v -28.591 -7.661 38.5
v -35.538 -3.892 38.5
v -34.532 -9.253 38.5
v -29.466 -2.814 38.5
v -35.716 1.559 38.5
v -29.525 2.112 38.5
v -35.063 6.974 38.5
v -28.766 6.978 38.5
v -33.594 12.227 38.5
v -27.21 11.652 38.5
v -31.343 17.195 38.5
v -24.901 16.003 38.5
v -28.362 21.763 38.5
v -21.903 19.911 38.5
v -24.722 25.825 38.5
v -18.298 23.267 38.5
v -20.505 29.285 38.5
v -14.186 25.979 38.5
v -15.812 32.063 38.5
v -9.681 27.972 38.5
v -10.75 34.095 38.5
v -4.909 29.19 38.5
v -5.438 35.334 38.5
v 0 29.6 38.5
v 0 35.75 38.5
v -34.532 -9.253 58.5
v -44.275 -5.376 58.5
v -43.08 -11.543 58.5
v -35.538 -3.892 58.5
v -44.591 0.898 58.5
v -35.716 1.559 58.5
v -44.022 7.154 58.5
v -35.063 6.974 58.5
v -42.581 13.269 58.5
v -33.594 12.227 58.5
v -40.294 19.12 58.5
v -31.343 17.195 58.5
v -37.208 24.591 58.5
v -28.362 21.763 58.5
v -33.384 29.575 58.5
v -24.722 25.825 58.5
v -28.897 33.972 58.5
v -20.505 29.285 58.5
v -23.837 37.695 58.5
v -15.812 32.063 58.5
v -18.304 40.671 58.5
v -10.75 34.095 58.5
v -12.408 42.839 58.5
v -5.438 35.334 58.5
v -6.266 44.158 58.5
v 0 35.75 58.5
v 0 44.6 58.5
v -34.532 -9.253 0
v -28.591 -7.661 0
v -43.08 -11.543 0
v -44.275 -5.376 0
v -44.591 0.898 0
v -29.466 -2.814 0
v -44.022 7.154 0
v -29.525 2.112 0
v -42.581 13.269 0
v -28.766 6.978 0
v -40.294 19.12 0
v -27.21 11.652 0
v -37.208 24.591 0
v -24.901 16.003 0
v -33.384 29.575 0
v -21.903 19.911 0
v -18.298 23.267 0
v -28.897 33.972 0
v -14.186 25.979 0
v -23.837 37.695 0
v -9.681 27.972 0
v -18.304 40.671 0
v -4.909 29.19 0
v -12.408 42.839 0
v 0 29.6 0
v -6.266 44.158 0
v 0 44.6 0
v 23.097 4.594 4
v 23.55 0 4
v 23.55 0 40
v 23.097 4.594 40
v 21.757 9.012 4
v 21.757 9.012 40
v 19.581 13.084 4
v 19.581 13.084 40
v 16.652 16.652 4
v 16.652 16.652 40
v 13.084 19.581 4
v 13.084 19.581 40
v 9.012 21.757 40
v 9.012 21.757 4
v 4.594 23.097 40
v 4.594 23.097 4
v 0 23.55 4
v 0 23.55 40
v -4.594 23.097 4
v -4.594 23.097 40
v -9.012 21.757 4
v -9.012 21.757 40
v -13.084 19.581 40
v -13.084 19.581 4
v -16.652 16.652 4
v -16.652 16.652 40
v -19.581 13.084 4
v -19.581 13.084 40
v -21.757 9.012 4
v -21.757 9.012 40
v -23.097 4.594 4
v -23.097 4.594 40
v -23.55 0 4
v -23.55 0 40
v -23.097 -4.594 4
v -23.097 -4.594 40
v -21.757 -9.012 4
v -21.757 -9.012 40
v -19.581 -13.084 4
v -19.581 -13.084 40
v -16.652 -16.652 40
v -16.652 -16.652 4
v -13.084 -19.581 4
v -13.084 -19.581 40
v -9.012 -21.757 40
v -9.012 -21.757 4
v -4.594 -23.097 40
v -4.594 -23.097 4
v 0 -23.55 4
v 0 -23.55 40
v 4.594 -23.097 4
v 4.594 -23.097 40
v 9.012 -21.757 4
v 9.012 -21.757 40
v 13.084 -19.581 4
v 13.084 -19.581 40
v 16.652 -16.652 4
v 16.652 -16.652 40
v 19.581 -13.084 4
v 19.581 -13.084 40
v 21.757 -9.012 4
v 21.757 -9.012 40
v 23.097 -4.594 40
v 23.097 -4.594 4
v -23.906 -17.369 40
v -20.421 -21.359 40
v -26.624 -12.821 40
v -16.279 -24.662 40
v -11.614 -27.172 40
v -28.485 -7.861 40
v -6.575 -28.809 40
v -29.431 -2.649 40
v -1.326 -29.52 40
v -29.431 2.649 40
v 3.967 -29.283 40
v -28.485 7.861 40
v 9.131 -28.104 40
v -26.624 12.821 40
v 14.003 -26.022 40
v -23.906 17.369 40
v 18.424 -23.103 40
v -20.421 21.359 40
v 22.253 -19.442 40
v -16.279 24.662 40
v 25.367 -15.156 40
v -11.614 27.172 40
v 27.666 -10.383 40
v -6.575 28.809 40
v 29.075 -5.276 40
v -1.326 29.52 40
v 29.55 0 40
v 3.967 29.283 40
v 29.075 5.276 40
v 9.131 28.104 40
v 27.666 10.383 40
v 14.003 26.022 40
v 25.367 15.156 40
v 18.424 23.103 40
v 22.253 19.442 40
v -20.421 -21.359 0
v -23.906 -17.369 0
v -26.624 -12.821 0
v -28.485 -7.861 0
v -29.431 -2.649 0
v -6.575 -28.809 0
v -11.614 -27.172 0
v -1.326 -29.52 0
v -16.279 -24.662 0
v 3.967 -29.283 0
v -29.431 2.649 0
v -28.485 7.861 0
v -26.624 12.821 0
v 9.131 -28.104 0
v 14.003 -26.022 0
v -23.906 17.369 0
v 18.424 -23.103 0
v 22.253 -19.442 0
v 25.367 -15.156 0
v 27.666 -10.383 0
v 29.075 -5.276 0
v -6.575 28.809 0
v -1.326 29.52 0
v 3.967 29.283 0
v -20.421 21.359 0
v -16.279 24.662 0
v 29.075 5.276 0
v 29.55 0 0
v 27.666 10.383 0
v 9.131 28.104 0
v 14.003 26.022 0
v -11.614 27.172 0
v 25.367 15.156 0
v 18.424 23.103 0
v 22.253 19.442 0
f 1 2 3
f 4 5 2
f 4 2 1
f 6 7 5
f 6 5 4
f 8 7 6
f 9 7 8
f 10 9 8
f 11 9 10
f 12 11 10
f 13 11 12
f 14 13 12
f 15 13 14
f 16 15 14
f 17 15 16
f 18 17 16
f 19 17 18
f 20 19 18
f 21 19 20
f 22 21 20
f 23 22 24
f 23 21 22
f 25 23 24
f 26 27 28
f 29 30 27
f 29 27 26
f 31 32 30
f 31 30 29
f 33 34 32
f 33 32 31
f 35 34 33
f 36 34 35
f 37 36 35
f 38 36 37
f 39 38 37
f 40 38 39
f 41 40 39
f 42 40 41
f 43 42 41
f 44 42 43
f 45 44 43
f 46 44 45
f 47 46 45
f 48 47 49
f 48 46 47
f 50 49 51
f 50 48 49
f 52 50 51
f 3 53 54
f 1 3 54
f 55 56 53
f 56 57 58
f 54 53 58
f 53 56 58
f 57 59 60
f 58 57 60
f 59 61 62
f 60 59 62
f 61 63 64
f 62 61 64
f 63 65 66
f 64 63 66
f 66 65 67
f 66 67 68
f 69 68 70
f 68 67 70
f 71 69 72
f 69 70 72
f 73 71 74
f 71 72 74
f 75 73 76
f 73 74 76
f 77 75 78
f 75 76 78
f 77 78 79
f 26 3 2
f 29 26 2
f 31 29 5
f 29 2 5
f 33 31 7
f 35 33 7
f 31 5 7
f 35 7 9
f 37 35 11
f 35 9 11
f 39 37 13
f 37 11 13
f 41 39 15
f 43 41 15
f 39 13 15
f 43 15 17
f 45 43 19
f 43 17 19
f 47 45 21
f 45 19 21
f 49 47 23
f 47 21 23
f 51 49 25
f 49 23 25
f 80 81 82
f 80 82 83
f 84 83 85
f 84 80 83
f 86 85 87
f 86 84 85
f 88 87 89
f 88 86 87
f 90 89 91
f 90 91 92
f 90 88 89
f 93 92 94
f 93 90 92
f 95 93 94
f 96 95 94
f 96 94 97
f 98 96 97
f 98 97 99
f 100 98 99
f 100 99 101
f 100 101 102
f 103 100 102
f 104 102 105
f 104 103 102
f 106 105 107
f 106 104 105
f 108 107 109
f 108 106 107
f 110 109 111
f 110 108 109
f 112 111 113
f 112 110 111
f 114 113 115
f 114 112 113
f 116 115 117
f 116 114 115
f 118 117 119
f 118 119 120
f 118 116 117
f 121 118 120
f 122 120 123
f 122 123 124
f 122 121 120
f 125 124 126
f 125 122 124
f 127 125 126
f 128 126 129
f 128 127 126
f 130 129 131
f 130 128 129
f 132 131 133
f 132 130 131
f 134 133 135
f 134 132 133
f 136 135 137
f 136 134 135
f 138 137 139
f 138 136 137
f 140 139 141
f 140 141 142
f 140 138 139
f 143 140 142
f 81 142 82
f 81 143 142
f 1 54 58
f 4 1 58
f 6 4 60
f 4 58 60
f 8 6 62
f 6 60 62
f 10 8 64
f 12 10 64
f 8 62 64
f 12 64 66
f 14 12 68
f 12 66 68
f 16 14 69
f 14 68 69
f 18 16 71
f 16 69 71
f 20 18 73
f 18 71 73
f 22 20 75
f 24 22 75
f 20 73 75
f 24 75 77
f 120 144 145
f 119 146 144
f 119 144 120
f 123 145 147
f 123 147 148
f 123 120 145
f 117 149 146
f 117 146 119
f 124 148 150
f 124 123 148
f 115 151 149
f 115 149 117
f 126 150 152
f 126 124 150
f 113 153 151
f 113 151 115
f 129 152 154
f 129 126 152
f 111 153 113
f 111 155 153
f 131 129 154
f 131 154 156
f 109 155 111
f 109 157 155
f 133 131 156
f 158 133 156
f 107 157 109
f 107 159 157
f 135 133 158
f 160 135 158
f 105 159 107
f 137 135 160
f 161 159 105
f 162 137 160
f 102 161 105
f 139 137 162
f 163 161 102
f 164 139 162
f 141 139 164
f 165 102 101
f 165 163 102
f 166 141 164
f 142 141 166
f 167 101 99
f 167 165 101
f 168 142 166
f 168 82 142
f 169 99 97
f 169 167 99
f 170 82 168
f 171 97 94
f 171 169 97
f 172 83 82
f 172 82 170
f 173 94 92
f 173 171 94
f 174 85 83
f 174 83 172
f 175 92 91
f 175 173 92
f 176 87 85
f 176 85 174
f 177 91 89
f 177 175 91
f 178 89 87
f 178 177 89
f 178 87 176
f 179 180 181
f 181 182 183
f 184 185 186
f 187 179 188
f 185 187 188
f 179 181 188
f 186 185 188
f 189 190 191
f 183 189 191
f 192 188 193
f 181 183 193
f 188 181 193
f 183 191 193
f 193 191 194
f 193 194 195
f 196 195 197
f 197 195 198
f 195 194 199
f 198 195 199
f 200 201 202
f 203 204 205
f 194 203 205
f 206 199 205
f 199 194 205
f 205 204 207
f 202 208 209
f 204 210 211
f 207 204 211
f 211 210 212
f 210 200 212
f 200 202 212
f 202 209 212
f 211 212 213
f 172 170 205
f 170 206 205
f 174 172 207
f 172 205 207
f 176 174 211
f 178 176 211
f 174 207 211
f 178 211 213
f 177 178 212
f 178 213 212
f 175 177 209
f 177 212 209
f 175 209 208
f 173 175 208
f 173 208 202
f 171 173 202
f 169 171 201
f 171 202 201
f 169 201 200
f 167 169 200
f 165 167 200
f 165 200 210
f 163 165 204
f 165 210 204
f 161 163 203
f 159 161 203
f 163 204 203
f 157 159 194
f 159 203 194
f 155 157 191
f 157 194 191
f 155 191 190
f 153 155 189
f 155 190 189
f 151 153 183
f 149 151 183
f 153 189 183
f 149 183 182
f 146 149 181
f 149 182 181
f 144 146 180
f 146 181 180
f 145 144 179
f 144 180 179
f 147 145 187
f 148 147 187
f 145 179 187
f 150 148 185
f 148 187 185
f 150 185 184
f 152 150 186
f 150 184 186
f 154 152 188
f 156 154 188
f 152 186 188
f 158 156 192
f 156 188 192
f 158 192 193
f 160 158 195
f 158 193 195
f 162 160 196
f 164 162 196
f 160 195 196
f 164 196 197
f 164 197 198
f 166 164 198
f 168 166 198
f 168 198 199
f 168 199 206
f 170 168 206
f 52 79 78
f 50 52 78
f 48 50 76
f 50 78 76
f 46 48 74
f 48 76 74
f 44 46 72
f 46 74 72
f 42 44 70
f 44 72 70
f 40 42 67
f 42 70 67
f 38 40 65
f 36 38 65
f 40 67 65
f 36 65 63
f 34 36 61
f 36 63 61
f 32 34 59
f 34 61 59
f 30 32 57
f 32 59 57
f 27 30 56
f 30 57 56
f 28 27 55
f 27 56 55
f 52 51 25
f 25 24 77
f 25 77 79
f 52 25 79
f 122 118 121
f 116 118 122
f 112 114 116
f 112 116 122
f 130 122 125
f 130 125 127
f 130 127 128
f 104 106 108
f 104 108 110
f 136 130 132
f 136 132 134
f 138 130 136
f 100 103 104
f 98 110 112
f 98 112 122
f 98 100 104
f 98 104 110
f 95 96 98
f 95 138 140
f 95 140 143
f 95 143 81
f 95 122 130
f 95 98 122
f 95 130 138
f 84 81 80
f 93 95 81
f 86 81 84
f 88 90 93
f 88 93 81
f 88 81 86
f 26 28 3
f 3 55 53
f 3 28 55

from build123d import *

# Parameters (mm, degrees)
F0_R     = 29.55
F1_DEPTH = 4
F2_R     = 29.55
F2_R_2   = 23.55
F3_DEPTH = 36
F5_DEPTH = 38.5
F6_DEPTH = 58.5


with BuildPart() as f1:
    # F0 (on Top) → F1 (new body)
    with BuildSketch(Plane.XY):
        Circle(F0_R)
    extrude(amount=F1_DEPTH)

    # F2 (on face) → F3 (join)
    with BuildSketch(Plane.XY.offset(4)):
        Circle(F2_R)
        Circle(F2_R_2, mode=Mode.SUBTRACT)
    extrude(amount=F3_DEPTH)


with BuildPart() as f5:
    # F4 (on Top) → F5 (new body)
    with BuildSketch(Plane.XY):
        with BuildLine():
            ThreePointArc((-28.5914044582, -7.661043735), (-23.4832588726, 18.0193382987), (0, 29.6))
            Line((0, 29.6), (0, 35.75))
            ThreePointArc((0, 35.75), (-28.3623819154, 21.7632210871), (-34.5318482898, -9.2527808624))
            Line((-34.5318482898, -9.2527808624), (-28.5914044582, -7.661043735))
        make_face()
    extrude(amount=F5_DEPTH)

    # F4 (on Top) → F6 (join)
    with BuildSketch(Plane.XY):
        with BuildLine():
            ThreePointArc((-34.5318482898, -9.2527808624), (-28.3623819154, 21.7632210871), (0, 35.75))
            Line((0, 35.75), (0, 44.6))
            ThreePointArc((0, 44.6), (-35.383558977, 27.1507597338), (-43.0802918525, -11.5433294116))
            Line((-43.0802918525, -11.5433294116), (-34.5318482898, -9.2527808624))
        make_face()
    extrude(amount=F6_DEPTH)


solid = Compound([f1.part, f5.part])
